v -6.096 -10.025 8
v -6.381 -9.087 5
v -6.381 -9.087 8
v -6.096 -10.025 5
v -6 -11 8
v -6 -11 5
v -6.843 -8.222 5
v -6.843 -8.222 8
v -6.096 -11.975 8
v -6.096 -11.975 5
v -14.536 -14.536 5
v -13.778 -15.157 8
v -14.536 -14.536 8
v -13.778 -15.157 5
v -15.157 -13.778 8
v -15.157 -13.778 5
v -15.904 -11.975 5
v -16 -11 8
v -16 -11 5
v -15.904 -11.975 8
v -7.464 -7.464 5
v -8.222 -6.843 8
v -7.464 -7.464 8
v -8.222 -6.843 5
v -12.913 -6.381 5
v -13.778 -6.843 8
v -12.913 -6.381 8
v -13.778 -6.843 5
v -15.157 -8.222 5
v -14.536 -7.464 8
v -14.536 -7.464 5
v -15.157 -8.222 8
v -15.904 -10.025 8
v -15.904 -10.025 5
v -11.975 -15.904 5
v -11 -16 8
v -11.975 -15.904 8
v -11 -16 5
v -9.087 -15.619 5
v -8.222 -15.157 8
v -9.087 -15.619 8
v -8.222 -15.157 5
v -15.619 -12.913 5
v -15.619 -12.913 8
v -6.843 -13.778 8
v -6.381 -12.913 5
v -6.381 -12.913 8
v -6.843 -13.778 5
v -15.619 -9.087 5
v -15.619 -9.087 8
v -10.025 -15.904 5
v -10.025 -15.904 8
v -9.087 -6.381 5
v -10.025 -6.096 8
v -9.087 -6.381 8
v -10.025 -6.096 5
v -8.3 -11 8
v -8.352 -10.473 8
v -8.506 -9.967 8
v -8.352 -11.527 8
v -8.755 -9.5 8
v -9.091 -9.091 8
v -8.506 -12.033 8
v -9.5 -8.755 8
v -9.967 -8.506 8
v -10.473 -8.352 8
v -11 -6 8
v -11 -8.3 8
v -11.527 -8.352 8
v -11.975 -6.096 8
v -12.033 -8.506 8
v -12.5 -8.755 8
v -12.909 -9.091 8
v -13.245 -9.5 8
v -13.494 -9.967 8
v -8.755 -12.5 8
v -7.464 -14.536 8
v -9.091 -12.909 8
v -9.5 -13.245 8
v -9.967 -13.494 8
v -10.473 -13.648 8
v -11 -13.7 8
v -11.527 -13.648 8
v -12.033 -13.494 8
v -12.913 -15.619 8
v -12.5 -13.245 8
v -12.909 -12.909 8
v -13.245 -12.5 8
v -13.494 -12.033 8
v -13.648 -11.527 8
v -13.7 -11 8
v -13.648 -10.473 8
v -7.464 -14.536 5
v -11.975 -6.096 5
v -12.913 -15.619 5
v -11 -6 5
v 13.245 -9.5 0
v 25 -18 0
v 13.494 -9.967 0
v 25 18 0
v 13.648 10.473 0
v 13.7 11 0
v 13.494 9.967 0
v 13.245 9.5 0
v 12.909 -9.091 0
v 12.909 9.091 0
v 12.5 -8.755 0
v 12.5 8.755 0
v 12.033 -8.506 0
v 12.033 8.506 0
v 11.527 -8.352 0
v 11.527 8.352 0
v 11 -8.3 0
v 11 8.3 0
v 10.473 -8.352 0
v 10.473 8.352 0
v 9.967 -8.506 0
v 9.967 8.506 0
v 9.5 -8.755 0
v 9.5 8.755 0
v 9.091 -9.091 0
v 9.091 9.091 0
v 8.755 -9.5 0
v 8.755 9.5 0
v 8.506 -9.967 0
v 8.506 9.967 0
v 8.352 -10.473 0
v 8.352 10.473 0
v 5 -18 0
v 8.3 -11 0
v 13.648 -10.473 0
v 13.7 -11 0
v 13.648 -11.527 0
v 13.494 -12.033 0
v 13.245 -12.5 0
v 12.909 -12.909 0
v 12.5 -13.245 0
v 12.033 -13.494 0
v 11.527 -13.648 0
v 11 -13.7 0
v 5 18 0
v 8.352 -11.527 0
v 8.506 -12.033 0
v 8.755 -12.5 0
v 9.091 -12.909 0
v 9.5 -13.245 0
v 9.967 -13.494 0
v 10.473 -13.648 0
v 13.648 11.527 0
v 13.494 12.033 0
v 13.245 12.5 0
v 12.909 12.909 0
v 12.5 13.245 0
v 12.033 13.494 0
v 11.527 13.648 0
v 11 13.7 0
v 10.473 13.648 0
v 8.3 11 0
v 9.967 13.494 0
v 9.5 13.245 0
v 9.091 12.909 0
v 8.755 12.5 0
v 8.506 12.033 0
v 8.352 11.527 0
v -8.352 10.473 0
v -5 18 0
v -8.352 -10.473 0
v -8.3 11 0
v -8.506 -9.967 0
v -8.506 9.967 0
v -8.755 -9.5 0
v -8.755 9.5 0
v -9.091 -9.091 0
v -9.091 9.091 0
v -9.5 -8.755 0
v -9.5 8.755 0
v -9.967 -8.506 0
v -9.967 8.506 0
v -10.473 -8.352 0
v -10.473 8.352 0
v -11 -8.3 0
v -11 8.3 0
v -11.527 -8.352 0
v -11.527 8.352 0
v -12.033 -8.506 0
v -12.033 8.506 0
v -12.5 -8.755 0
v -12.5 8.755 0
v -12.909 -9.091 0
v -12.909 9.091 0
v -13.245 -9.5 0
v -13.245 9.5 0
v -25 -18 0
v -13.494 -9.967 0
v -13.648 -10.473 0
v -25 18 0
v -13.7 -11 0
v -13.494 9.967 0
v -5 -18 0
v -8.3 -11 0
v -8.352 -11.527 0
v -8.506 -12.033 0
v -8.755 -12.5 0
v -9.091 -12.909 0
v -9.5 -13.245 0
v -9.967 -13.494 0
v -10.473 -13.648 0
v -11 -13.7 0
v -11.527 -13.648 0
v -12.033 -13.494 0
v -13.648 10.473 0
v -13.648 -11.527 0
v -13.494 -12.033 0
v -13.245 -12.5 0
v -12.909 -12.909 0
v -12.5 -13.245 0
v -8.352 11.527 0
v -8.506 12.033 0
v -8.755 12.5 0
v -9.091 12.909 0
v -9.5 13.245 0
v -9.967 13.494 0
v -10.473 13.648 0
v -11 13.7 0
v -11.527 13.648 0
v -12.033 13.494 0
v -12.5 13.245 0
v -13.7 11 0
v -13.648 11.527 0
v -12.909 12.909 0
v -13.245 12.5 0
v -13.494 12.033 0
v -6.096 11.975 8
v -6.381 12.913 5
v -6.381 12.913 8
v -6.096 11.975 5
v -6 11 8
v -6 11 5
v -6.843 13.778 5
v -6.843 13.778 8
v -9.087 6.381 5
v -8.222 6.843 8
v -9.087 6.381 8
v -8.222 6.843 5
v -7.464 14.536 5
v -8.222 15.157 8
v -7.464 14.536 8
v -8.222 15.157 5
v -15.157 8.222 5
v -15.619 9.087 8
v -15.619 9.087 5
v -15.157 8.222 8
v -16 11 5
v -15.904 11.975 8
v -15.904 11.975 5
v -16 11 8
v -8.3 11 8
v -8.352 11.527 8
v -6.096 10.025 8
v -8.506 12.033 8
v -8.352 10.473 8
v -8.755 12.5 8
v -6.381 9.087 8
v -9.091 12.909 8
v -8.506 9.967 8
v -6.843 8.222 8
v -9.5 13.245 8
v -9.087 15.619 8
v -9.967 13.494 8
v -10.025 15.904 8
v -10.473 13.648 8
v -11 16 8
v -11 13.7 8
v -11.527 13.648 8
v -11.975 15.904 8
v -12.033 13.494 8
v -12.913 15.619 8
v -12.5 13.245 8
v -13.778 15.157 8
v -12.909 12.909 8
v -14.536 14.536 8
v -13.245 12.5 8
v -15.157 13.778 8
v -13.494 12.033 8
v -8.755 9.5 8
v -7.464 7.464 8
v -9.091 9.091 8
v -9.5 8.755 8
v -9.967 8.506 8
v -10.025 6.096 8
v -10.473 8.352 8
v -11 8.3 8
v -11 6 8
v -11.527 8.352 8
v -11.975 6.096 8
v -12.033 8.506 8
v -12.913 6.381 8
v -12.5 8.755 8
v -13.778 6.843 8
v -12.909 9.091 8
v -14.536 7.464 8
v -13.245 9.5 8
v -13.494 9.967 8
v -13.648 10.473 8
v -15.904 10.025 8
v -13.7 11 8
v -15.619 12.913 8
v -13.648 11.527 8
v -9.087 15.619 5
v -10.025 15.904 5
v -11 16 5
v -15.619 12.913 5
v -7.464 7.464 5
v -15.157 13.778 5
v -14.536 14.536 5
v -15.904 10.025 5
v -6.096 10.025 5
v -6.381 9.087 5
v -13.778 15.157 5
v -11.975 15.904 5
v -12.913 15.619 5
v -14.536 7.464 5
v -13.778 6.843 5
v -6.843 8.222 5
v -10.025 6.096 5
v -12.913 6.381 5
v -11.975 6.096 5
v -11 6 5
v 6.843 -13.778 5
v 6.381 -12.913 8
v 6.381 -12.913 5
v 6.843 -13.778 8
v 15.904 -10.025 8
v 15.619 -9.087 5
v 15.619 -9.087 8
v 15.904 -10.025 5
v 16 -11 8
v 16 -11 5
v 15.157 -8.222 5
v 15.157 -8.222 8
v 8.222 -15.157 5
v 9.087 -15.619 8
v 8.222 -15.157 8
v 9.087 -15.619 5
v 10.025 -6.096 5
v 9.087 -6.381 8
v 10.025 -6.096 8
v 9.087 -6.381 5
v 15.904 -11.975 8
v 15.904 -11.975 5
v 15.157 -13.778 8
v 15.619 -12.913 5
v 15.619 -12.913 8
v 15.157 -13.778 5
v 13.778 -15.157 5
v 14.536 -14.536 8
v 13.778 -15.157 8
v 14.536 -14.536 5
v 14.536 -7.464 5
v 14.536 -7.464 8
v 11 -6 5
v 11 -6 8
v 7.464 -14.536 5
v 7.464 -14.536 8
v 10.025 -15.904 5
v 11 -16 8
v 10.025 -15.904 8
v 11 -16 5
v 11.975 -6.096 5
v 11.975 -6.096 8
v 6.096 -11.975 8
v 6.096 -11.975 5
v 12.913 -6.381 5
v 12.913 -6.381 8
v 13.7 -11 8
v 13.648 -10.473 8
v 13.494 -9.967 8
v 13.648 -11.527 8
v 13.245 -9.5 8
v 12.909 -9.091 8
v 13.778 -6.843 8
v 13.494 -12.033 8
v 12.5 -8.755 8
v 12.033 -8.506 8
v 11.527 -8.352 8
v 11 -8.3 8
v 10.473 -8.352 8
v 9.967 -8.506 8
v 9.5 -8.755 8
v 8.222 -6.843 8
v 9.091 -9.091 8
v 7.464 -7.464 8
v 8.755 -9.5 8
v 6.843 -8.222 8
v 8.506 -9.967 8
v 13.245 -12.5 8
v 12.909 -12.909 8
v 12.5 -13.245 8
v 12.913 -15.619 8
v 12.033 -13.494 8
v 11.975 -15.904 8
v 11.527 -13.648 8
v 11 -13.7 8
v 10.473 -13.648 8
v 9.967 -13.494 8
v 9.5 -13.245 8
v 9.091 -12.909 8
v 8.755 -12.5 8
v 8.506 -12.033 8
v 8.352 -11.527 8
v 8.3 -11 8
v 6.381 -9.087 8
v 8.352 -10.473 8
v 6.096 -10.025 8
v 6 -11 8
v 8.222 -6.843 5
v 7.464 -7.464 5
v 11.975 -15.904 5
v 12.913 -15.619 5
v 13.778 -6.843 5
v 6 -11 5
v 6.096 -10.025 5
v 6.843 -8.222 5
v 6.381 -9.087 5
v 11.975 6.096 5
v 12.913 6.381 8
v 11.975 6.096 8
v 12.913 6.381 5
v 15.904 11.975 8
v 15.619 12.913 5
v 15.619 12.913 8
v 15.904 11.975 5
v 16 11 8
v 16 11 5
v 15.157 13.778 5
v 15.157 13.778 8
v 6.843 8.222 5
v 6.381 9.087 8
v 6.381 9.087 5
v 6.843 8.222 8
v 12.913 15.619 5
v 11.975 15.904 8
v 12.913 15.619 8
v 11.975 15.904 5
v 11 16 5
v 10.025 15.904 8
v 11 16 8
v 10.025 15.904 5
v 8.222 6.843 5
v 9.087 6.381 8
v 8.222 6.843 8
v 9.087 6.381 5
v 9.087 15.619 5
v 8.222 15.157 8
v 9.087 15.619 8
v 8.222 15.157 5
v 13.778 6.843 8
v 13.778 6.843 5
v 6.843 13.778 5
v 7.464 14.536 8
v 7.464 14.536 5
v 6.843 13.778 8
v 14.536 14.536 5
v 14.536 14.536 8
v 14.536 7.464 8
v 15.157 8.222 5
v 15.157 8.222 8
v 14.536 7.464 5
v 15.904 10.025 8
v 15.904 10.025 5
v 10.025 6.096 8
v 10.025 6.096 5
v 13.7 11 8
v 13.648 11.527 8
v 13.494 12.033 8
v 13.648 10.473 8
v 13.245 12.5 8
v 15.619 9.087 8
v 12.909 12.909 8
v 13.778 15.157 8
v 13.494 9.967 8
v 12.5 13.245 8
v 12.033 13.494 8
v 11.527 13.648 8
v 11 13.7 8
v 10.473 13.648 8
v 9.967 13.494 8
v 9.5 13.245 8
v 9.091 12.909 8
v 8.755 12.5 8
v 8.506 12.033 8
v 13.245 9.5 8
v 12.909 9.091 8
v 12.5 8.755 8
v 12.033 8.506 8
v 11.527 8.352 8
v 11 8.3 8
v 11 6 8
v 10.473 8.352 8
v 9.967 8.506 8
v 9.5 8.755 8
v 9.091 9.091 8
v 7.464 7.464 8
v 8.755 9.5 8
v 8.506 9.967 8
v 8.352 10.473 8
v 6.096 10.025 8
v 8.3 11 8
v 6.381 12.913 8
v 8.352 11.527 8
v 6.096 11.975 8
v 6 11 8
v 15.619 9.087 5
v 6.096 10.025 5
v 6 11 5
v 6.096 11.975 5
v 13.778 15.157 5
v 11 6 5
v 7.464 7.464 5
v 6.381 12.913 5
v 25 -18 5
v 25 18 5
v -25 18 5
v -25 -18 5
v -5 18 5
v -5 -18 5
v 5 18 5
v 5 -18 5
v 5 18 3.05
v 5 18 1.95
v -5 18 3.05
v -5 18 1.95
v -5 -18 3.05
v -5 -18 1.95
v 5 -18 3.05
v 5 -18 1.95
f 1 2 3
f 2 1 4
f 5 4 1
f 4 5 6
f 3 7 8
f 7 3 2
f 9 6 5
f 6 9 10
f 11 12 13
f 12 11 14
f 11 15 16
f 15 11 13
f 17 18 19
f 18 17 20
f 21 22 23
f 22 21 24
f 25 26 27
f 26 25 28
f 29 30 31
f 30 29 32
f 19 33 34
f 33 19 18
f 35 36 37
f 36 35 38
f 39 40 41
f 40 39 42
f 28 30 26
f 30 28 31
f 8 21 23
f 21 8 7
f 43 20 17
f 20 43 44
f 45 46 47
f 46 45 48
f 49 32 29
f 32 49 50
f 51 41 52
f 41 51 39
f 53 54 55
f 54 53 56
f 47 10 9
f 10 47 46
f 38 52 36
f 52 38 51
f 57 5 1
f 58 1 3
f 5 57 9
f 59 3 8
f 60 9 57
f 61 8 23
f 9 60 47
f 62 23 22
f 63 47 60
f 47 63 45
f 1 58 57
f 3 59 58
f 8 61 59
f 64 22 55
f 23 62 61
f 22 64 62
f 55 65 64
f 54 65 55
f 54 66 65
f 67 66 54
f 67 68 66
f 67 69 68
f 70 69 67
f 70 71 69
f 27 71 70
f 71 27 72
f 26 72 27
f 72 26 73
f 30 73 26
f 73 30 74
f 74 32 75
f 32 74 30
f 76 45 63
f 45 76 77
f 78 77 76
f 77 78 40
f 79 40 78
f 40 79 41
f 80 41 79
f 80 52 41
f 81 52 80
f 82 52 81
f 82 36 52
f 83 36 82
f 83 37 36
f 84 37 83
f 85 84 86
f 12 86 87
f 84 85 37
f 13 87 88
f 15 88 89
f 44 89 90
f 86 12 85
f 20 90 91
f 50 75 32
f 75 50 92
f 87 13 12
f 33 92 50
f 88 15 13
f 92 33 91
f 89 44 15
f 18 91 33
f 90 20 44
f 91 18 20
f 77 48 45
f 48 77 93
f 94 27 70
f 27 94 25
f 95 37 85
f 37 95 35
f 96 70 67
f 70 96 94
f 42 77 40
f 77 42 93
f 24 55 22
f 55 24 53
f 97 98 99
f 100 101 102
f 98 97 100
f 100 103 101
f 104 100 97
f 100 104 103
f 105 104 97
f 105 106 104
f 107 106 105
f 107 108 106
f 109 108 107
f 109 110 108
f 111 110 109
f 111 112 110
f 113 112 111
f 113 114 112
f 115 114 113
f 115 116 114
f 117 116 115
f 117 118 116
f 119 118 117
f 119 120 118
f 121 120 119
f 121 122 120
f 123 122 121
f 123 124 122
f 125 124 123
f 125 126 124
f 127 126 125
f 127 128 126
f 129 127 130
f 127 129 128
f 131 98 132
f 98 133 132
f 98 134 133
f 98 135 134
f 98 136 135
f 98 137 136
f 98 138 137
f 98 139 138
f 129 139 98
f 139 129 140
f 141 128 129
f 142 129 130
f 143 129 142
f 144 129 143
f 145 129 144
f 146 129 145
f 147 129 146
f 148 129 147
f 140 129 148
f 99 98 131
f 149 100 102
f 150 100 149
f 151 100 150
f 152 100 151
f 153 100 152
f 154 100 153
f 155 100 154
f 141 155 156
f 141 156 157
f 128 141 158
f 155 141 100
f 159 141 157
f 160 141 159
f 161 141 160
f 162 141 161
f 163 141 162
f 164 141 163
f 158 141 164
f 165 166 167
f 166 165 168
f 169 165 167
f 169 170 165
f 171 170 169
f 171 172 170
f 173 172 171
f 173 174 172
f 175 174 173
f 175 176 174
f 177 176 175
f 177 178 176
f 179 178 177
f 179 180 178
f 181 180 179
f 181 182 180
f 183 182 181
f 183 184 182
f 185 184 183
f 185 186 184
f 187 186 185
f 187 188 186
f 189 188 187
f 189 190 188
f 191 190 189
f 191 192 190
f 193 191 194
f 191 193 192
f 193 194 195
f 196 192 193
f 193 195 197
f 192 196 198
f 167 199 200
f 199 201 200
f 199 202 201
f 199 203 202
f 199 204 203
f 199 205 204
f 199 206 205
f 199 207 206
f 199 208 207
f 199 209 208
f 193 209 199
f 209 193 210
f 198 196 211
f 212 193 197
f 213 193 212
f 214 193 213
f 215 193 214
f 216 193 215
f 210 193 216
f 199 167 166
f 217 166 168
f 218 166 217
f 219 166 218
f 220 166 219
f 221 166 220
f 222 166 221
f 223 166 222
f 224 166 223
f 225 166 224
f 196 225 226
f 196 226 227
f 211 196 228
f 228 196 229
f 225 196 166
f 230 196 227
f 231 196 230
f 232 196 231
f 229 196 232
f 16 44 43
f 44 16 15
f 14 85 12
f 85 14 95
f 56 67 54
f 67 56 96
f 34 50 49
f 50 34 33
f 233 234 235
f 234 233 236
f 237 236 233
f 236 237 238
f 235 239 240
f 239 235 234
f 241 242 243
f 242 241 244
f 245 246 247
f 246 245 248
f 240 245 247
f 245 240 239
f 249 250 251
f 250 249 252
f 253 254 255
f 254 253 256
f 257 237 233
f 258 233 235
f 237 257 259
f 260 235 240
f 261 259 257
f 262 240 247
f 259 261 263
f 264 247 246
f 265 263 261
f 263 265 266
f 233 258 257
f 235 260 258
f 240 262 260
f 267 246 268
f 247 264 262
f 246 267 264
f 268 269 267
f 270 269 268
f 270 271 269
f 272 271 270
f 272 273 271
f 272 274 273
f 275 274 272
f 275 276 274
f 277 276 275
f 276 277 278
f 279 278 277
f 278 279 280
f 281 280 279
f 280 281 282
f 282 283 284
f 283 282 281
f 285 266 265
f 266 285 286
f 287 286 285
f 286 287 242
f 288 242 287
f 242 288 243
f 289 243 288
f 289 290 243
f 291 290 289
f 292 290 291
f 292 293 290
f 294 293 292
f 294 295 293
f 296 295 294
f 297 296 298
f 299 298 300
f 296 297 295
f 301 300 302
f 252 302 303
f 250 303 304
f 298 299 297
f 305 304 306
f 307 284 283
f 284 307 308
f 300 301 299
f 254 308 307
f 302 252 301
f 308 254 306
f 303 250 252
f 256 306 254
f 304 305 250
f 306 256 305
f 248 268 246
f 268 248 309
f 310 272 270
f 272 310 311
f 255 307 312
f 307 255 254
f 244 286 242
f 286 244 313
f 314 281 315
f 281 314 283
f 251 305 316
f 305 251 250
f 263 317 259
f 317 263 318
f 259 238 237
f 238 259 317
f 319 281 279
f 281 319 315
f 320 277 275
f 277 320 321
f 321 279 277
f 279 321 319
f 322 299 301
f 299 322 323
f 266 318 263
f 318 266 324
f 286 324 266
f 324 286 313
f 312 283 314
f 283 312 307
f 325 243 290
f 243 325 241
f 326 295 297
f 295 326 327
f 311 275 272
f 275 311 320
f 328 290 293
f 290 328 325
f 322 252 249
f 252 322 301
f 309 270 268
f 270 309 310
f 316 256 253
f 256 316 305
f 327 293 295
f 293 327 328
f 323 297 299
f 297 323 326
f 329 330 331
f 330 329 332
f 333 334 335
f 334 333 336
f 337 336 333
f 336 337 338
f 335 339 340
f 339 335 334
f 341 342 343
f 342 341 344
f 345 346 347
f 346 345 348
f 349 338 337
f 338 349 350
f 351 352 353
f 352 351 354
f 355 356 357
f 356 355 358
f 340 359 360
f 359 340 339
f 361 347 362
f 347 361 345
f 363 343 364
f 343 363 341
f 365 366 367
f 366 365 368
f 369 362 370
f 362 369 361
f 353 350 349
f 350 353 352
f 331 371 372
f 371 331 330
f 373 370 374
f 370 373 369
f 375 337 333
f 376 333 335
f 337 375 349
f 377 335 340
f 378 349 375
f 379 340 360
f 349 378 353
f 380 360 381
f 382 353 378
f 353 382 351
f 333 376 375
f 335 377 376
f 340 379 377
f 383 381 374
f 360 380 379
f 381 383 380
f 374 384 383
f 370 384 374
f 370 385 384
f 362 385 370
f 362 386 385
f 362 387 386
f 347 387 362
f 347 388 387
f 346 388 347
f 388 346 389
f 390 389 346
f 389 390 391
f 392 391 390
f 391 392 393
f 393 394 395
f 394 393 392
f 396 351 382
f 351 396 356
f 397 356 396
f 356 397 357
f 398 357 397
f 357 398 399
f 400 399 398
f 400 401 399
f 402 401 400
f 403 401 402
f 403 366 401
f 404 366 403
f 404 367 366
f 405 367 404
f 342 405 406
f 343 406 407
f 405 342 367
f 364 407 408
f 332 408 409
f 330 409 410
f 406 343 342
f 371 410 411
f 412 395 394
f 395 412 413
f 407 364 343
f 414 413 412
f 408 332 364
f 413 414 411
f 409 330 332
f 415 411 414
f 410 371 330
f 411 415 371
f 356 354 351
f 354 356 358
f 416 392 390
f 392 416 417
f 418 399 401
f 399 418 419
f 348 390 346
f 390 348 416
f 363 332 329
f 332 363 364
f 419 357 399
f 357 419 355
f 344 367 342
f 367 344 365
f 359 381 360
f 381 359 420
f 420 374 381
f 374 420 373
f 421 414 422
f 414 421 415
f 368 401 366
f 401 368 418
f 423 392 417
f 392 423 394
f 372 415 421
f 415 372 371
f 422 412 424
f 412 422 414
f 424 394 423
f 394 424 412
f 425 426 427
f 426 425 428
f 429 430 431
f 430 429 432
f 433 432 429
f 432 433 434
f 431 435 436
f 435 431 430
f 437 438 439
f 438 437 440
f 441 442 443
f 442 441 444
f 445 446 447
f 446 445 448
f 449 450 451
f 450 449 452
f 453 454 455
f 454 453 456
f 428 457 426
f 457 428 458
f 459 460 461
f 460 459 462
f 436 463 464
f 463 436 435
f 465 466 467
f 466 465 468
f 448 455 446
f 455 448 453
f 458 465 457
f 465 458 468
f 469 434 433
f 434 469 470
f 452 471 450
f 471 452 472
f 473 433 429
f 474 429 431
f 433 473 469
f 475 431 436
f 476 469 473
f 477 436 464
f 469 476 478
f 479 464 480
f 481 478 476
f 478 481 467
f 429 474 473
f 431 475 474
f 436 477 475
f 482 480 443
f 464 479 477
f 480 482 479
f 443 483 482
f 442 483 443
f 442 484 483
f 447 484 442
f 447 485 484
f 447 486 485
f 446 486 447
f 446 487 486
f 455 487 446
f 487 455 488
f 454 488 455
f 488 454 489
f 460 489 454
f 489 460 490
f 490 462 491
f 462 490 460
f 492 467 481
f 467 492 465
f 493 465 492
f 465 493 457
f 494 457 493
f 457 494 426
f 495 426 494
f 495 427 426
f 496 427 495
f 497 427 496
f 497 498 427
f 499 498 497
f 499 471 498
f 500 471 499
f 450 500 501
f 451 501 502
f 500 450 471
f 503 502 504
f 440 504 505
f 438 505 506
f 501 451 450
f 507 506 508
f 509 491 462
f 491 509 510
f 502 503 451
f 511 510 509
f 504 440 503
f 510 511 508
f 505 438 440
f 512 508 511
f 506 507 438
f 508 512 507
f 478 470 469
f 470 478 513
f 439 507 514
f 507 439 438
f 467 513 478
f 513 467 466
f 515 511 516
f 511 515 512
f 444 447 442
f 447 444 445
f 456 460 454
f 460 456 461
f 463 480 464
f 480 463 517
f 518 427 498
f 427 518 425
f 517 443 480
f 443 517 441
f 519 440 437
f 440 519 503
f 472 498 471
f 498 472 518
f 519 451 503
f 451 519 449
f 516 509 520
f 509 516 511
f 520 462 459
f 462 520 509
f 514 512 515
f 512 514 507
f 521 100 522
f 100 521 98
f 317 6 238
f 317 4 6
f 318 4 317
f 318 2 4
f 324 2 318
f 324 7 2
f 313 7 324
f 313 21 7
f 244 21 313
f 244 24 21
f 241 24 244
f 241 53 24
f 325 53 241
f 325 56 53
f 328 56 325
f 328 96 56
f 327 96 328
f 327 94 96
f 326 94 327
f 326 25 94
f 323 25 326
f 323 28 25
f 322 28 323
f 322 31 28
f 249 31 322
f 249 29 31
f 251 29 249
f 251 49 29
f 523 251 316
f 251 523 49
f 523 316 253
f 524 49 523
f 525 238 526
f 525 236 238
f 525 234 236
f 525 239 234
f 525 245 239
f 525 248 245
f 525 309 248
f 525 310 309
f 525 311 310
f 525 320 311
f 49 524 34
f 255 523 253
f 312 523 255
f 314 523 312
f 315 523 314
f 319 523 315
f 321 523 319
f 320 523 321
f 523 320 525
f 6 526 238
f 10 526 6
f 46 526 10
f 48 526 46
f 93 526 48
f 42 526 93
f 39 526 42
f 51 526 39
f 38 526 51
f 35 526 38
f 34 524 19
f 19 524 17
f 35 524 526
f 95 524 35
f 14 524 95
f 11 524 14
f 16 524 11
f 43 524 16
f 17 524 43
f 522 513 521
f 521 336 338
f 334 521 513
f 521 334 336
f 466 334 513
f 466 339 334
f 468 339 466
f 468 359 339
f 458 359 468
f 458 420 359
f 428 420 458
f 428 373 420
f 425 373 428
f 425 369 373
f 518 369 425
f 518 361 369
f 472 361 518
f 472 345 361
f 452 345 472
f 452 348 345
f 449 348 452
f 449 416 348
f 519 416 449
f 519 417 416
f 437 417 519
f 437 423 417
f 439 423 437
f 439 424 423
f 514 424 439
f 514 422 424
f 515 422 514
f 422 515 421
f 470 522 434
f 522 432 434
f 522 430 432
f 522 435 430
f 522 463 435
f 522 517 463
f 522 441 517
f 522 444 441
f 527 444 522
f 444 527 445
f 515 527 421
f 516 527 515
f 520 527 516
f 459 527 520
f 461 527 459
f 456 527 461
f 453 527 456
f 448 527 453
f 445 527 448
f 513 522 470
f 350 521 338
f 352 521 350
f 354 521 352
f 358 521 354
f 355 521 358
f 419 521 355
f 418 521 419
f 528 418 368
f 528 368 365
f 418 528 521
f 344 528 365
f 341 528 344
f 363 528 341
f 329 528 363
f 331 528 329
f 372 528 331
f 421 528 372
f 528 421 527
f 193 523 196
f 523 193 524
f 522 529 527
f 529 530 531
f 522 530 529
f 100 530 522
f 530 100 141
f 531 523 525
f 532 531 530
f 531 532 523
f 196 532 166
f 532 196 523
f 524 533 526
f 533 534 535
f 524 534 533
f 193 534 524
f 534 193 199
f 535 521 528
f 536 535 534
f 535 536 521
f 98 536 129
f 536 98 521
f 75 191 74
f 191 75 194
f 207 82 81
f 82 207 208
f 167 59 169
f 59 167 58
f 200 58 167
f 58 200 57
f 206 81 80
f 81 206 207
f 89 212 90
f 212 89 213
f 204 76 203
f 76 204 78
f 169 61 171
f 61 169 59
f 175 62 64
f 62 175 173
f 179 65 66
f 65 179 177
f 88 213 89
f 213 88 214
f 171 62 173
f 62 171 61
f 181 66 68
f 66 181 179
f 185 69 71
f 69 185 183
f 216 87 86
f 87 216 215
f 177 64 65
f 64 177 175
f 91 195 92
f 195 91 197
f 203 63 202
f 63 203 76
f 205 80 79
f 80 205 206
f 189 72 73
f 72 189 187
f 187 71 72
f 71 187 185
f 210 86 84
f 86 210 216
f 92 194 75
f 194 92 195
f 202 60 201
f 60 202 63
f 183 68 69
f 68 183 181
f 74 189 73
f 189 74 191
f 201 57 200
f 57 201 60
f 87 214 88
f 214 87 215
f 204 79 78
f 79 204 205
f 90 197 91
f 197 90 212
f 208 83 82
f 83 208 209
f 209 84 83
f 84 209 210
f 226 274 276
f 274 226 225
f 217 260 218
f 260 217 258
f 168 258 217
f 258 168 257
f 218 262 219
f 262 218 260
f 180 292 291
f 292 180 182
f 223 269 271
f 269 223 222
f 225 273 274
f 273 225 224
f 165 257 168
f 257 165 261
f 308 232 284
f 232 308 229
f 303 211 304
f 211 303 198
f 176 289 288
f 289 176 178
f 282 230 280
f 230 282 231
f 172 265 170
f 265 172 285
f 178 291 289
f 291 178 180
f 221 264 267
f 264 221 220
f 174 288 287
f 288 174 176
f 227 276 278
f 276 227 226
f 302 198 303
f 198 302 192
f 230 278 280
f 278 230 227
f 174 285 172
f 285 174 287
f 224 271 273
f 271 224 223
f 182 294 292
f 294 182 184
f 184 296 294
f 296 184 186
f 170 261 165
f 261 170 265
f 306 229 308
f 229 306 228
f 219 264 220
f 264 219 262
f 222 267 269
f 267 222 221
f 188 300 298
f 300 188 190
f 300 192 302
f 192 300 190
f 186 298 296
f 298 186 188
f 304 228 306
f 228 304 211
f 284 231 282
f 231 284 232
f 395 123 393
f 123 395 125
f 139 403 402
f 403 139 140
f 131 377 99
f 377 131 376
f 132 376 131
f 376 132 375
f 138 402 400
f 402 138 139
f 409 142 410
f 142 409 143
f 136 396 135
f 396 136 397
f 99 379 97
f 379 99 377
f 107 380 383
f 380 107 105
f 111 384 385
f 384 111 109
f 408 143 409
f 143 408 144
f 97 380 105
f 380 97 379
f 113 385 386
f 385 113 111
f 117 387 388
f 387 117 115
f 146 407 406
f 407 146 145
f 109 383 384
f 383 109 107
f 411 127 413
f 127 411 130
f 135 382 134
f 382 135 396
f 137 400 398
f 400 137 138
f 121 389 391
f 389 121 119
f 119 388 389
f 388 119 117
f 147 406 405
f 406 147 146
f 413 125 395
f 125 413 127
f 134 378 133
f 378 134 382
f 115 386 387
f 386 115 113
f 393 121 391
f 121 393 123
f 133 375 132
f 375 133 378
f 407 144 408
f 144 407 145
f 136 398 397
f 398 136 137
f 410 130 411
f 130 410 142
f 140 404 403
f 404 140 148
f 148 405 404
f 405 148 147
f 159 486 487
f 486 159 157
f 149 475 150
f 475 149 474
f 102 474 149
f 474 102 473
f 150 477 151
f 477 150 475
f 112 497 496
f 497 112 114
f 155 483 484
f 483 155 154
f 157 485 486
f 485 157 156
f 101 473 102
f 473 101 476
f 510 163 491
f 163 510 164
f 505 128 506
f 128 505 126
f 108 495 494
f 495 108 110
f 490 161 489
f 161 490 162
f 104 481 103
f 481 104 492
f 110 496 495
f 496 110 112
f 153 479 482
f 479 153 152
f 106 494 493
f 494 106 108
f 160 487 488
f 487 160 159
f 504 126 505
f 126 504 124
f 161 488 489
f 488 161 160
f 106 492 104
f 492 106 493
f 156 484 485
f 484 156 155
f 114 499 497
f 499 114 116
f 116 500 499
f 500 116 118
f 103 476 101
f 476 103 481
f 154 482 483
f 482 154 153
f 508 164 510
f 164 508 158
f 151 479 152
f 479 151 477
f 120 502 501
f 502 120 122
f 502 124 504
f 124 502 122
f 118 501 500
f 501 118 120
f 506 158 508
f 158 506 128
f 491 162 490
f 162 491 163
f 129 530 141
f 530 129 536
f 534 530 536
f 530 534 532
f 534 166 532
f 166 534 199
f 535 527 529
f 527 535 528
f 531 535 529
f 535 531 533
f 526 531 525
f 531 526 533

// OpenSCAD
$fn = 32;

// ----------------------------------------------------------------------
// Living hinge: 50 x 36 mm plates, 1.1 mm flexible web
// ----------------------------------------------------------------------

// --- parameters (mm) ---
plate_len = 20;           // plate length outside the web
plate_w = 36;             // plate width
thick = 5;                // plate thickness
web_half = 5;             // half width of the flex band
web_t = 1.1;              // flexible web thickness
web_z = 1.95;             // web position inside the thickness
boss_d = 10;              // screw boss diameter
boss_h = 8;               // screw boss height
boss_x = 11;              // screw boss distance from the web
screw_d = 5.4;            // screw hole

difference() {
  union() {
    /* one flat strip, later thinned at the middle */
    translate([-25, -18, 0]) cube([50, 36, 5]);
    /* screw bosses, sunk 0.5 mm into the plates */
    for (sx = [-11, 11]) {
      for (sy = [-11, 11]) {
        translate([sx, sy, 0]) cylinder(h = boss_h, d = boss_d);
      }
    }
  }
  /* channel from below: leaves the web on top of it */
  translate([-5, -20.5, -2.5]) cube([10, 41, 4.45]);
  /* channel from above: thins the web down to web_t */
  translate([-5, -20.5, 3.05]) cube([10, 41, 4.45]);
  /* screw holes through the bosses */
  for (sx = [-11, 11]) {
    for (sy = [-11, 11]) {
      translate([sx, sy, -2.5]) cylinder(h = boss_h + 5, d = screw_d);
    }
  }
}
